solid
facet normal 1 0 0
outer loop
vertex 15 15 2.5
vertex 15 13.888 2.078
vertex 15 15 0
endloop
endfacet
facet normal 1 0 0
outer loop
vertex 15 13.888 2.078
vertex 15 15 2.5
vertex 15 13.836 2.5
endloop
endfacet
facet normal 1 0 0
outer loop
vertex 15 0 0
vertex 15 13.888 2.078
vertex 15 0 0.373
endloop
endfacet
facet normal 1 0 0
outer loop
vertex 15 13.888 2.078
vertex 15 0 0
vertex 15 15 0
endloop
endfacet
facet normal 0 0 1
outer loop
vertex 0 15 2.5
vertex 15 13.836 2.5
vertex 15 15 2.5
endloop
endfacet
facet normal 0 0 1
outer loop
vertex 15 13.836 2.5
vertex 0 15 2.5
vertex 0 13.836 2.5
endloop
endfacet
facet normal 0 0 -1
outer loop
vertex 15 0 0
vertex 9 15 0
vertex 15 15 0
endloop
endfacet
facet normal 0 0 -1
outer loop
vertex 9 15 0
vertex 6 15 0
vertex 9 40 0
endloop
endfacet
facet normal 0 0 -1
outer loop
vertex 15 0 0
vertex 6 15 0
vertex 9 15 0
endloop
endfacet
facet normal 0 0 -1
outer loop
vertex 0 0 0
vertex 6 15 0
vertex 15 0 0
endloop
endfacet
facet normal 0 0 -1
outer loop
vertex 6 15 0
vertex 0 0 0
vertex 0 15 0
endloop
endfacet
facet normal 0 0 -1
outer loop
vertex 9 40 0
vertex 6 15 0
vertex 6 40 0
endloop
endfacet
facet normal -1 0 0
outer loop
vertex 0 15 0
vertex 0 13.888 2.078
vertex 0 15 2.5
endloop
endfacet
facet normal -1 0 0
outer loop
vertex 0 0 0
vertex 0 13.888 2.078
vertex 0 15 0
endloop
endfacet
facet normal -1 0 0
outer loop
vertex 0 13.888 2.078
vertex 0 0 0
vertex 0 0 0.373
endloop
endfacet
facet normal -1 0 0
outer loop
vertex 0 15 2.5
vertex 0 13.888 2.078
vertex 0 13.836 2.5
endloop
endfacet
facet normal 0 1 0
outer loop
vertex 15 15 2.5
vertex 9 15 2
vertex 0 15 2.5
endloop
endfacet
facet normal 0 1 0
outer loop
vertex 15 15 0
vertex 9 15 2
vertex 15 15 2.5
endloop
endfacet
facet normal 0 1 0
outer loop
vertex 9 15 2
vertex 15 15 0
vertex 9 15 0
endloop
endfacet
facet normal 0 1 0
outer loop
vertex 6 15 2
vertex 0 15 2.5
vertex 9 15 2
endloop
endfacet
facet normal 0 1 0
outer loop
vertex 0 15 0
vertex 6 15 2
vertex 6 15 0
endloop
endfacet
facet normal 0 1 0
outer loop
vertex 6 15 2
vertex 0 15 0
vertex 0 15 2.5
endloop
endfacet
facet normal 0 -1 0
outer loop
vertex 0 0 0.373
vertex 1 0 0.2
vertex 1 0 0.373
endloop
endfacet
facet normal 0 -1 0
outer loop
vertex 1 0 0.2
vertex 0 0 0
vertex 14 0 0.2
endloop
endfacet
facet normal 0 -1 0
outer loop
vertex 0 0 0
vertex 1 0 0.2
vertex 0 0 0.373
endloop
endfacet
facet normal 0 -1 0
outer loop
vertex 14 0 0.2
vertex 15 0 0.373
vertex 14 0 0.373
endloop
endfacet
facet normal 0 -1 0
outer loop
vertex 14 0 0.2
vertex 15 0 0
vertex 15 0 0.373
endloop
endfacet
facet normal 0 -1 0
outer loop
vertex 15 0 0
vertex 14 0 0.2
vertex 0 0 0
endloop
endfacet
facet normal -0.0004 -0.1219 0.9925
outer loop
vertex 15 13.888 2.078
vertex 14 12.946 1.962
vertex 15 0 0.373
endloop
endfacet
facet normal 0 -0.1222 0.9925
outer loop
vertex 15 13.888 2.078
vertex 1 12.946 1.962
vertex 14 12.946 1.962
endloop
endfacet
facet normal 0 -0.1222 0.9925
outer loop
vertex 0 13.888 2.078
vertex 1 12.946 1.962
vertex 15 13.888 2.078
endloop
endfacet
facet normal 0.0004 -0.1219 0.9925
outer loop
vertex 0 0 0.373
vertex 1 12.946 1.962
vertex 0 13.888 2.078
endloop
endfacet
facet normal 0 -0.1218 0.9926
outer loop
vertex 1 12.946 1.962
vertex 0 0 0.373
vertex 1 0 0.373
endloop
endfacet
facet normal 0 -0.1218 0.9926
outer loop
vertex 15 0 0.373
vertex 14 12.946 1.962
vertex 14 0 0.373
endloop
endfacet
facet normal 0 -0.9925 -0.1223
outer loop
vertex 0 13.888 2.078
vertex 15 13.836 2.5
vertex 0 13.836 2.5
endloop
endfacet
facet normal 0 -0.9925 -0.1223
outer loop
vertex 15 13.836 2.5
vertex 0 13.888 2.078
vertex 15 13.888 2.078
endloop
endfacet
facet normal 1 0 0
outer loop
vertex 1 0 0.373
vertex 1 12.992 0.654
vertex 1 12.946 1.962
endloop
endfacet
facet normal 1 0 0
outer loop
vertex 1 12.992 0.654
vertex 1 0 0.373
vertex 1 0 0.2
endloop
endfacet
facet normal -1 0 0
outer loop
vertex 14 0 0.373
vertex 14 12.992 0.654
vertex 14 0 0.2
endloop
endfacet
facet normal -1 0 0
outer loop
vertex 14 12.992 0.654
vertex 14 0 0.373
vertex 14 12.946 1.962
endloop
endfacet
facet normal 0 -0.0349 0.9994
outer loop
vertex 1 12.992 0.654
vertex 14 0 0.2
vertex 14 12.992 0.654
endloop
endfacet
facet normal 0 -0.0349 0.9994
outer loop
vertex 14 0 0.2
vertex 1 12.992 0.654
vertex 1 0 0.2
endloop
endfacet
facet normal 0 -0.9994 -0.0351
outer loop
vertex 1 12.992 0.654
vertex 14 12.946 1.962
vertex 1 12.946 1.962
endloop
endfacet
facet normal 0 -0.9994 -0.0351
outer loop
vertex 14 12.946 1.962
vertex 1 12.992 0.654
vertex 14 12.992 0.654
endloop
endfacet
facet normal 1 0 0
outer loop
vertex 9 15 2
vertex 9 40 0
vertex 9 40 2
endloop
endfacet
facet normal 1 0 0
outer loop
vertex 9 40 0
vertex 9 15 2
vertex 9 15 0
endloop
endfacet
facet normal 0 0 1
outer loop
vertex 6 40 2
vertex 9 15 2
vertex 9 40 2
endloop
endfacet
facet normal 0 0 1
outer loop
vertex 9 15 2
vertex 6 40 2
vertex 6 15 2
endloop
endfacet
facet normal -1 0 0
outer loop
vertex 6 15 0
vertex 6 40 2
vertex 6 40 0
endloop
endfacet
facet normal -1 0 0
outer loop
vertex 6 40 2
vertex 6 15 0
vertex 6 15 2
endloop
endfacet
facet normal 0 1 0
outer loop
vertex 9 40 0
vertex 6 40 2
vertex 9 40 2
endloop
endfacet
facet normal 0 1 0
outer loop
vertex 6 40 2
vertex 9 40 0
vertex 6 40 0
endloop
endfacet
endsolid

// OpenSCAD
union(){
    difference(){
        cube([15, 15, 2.5]);
        translate([0,-1,0.25])
            rotate([7,0,0])
            cube([16,15,5]);
        translate([1,0,0.2])
            rotate([2,0,0])
            cube([13,13,5]);
    }
    translate([6,15,0])
        cube([3,25,2]);
}
